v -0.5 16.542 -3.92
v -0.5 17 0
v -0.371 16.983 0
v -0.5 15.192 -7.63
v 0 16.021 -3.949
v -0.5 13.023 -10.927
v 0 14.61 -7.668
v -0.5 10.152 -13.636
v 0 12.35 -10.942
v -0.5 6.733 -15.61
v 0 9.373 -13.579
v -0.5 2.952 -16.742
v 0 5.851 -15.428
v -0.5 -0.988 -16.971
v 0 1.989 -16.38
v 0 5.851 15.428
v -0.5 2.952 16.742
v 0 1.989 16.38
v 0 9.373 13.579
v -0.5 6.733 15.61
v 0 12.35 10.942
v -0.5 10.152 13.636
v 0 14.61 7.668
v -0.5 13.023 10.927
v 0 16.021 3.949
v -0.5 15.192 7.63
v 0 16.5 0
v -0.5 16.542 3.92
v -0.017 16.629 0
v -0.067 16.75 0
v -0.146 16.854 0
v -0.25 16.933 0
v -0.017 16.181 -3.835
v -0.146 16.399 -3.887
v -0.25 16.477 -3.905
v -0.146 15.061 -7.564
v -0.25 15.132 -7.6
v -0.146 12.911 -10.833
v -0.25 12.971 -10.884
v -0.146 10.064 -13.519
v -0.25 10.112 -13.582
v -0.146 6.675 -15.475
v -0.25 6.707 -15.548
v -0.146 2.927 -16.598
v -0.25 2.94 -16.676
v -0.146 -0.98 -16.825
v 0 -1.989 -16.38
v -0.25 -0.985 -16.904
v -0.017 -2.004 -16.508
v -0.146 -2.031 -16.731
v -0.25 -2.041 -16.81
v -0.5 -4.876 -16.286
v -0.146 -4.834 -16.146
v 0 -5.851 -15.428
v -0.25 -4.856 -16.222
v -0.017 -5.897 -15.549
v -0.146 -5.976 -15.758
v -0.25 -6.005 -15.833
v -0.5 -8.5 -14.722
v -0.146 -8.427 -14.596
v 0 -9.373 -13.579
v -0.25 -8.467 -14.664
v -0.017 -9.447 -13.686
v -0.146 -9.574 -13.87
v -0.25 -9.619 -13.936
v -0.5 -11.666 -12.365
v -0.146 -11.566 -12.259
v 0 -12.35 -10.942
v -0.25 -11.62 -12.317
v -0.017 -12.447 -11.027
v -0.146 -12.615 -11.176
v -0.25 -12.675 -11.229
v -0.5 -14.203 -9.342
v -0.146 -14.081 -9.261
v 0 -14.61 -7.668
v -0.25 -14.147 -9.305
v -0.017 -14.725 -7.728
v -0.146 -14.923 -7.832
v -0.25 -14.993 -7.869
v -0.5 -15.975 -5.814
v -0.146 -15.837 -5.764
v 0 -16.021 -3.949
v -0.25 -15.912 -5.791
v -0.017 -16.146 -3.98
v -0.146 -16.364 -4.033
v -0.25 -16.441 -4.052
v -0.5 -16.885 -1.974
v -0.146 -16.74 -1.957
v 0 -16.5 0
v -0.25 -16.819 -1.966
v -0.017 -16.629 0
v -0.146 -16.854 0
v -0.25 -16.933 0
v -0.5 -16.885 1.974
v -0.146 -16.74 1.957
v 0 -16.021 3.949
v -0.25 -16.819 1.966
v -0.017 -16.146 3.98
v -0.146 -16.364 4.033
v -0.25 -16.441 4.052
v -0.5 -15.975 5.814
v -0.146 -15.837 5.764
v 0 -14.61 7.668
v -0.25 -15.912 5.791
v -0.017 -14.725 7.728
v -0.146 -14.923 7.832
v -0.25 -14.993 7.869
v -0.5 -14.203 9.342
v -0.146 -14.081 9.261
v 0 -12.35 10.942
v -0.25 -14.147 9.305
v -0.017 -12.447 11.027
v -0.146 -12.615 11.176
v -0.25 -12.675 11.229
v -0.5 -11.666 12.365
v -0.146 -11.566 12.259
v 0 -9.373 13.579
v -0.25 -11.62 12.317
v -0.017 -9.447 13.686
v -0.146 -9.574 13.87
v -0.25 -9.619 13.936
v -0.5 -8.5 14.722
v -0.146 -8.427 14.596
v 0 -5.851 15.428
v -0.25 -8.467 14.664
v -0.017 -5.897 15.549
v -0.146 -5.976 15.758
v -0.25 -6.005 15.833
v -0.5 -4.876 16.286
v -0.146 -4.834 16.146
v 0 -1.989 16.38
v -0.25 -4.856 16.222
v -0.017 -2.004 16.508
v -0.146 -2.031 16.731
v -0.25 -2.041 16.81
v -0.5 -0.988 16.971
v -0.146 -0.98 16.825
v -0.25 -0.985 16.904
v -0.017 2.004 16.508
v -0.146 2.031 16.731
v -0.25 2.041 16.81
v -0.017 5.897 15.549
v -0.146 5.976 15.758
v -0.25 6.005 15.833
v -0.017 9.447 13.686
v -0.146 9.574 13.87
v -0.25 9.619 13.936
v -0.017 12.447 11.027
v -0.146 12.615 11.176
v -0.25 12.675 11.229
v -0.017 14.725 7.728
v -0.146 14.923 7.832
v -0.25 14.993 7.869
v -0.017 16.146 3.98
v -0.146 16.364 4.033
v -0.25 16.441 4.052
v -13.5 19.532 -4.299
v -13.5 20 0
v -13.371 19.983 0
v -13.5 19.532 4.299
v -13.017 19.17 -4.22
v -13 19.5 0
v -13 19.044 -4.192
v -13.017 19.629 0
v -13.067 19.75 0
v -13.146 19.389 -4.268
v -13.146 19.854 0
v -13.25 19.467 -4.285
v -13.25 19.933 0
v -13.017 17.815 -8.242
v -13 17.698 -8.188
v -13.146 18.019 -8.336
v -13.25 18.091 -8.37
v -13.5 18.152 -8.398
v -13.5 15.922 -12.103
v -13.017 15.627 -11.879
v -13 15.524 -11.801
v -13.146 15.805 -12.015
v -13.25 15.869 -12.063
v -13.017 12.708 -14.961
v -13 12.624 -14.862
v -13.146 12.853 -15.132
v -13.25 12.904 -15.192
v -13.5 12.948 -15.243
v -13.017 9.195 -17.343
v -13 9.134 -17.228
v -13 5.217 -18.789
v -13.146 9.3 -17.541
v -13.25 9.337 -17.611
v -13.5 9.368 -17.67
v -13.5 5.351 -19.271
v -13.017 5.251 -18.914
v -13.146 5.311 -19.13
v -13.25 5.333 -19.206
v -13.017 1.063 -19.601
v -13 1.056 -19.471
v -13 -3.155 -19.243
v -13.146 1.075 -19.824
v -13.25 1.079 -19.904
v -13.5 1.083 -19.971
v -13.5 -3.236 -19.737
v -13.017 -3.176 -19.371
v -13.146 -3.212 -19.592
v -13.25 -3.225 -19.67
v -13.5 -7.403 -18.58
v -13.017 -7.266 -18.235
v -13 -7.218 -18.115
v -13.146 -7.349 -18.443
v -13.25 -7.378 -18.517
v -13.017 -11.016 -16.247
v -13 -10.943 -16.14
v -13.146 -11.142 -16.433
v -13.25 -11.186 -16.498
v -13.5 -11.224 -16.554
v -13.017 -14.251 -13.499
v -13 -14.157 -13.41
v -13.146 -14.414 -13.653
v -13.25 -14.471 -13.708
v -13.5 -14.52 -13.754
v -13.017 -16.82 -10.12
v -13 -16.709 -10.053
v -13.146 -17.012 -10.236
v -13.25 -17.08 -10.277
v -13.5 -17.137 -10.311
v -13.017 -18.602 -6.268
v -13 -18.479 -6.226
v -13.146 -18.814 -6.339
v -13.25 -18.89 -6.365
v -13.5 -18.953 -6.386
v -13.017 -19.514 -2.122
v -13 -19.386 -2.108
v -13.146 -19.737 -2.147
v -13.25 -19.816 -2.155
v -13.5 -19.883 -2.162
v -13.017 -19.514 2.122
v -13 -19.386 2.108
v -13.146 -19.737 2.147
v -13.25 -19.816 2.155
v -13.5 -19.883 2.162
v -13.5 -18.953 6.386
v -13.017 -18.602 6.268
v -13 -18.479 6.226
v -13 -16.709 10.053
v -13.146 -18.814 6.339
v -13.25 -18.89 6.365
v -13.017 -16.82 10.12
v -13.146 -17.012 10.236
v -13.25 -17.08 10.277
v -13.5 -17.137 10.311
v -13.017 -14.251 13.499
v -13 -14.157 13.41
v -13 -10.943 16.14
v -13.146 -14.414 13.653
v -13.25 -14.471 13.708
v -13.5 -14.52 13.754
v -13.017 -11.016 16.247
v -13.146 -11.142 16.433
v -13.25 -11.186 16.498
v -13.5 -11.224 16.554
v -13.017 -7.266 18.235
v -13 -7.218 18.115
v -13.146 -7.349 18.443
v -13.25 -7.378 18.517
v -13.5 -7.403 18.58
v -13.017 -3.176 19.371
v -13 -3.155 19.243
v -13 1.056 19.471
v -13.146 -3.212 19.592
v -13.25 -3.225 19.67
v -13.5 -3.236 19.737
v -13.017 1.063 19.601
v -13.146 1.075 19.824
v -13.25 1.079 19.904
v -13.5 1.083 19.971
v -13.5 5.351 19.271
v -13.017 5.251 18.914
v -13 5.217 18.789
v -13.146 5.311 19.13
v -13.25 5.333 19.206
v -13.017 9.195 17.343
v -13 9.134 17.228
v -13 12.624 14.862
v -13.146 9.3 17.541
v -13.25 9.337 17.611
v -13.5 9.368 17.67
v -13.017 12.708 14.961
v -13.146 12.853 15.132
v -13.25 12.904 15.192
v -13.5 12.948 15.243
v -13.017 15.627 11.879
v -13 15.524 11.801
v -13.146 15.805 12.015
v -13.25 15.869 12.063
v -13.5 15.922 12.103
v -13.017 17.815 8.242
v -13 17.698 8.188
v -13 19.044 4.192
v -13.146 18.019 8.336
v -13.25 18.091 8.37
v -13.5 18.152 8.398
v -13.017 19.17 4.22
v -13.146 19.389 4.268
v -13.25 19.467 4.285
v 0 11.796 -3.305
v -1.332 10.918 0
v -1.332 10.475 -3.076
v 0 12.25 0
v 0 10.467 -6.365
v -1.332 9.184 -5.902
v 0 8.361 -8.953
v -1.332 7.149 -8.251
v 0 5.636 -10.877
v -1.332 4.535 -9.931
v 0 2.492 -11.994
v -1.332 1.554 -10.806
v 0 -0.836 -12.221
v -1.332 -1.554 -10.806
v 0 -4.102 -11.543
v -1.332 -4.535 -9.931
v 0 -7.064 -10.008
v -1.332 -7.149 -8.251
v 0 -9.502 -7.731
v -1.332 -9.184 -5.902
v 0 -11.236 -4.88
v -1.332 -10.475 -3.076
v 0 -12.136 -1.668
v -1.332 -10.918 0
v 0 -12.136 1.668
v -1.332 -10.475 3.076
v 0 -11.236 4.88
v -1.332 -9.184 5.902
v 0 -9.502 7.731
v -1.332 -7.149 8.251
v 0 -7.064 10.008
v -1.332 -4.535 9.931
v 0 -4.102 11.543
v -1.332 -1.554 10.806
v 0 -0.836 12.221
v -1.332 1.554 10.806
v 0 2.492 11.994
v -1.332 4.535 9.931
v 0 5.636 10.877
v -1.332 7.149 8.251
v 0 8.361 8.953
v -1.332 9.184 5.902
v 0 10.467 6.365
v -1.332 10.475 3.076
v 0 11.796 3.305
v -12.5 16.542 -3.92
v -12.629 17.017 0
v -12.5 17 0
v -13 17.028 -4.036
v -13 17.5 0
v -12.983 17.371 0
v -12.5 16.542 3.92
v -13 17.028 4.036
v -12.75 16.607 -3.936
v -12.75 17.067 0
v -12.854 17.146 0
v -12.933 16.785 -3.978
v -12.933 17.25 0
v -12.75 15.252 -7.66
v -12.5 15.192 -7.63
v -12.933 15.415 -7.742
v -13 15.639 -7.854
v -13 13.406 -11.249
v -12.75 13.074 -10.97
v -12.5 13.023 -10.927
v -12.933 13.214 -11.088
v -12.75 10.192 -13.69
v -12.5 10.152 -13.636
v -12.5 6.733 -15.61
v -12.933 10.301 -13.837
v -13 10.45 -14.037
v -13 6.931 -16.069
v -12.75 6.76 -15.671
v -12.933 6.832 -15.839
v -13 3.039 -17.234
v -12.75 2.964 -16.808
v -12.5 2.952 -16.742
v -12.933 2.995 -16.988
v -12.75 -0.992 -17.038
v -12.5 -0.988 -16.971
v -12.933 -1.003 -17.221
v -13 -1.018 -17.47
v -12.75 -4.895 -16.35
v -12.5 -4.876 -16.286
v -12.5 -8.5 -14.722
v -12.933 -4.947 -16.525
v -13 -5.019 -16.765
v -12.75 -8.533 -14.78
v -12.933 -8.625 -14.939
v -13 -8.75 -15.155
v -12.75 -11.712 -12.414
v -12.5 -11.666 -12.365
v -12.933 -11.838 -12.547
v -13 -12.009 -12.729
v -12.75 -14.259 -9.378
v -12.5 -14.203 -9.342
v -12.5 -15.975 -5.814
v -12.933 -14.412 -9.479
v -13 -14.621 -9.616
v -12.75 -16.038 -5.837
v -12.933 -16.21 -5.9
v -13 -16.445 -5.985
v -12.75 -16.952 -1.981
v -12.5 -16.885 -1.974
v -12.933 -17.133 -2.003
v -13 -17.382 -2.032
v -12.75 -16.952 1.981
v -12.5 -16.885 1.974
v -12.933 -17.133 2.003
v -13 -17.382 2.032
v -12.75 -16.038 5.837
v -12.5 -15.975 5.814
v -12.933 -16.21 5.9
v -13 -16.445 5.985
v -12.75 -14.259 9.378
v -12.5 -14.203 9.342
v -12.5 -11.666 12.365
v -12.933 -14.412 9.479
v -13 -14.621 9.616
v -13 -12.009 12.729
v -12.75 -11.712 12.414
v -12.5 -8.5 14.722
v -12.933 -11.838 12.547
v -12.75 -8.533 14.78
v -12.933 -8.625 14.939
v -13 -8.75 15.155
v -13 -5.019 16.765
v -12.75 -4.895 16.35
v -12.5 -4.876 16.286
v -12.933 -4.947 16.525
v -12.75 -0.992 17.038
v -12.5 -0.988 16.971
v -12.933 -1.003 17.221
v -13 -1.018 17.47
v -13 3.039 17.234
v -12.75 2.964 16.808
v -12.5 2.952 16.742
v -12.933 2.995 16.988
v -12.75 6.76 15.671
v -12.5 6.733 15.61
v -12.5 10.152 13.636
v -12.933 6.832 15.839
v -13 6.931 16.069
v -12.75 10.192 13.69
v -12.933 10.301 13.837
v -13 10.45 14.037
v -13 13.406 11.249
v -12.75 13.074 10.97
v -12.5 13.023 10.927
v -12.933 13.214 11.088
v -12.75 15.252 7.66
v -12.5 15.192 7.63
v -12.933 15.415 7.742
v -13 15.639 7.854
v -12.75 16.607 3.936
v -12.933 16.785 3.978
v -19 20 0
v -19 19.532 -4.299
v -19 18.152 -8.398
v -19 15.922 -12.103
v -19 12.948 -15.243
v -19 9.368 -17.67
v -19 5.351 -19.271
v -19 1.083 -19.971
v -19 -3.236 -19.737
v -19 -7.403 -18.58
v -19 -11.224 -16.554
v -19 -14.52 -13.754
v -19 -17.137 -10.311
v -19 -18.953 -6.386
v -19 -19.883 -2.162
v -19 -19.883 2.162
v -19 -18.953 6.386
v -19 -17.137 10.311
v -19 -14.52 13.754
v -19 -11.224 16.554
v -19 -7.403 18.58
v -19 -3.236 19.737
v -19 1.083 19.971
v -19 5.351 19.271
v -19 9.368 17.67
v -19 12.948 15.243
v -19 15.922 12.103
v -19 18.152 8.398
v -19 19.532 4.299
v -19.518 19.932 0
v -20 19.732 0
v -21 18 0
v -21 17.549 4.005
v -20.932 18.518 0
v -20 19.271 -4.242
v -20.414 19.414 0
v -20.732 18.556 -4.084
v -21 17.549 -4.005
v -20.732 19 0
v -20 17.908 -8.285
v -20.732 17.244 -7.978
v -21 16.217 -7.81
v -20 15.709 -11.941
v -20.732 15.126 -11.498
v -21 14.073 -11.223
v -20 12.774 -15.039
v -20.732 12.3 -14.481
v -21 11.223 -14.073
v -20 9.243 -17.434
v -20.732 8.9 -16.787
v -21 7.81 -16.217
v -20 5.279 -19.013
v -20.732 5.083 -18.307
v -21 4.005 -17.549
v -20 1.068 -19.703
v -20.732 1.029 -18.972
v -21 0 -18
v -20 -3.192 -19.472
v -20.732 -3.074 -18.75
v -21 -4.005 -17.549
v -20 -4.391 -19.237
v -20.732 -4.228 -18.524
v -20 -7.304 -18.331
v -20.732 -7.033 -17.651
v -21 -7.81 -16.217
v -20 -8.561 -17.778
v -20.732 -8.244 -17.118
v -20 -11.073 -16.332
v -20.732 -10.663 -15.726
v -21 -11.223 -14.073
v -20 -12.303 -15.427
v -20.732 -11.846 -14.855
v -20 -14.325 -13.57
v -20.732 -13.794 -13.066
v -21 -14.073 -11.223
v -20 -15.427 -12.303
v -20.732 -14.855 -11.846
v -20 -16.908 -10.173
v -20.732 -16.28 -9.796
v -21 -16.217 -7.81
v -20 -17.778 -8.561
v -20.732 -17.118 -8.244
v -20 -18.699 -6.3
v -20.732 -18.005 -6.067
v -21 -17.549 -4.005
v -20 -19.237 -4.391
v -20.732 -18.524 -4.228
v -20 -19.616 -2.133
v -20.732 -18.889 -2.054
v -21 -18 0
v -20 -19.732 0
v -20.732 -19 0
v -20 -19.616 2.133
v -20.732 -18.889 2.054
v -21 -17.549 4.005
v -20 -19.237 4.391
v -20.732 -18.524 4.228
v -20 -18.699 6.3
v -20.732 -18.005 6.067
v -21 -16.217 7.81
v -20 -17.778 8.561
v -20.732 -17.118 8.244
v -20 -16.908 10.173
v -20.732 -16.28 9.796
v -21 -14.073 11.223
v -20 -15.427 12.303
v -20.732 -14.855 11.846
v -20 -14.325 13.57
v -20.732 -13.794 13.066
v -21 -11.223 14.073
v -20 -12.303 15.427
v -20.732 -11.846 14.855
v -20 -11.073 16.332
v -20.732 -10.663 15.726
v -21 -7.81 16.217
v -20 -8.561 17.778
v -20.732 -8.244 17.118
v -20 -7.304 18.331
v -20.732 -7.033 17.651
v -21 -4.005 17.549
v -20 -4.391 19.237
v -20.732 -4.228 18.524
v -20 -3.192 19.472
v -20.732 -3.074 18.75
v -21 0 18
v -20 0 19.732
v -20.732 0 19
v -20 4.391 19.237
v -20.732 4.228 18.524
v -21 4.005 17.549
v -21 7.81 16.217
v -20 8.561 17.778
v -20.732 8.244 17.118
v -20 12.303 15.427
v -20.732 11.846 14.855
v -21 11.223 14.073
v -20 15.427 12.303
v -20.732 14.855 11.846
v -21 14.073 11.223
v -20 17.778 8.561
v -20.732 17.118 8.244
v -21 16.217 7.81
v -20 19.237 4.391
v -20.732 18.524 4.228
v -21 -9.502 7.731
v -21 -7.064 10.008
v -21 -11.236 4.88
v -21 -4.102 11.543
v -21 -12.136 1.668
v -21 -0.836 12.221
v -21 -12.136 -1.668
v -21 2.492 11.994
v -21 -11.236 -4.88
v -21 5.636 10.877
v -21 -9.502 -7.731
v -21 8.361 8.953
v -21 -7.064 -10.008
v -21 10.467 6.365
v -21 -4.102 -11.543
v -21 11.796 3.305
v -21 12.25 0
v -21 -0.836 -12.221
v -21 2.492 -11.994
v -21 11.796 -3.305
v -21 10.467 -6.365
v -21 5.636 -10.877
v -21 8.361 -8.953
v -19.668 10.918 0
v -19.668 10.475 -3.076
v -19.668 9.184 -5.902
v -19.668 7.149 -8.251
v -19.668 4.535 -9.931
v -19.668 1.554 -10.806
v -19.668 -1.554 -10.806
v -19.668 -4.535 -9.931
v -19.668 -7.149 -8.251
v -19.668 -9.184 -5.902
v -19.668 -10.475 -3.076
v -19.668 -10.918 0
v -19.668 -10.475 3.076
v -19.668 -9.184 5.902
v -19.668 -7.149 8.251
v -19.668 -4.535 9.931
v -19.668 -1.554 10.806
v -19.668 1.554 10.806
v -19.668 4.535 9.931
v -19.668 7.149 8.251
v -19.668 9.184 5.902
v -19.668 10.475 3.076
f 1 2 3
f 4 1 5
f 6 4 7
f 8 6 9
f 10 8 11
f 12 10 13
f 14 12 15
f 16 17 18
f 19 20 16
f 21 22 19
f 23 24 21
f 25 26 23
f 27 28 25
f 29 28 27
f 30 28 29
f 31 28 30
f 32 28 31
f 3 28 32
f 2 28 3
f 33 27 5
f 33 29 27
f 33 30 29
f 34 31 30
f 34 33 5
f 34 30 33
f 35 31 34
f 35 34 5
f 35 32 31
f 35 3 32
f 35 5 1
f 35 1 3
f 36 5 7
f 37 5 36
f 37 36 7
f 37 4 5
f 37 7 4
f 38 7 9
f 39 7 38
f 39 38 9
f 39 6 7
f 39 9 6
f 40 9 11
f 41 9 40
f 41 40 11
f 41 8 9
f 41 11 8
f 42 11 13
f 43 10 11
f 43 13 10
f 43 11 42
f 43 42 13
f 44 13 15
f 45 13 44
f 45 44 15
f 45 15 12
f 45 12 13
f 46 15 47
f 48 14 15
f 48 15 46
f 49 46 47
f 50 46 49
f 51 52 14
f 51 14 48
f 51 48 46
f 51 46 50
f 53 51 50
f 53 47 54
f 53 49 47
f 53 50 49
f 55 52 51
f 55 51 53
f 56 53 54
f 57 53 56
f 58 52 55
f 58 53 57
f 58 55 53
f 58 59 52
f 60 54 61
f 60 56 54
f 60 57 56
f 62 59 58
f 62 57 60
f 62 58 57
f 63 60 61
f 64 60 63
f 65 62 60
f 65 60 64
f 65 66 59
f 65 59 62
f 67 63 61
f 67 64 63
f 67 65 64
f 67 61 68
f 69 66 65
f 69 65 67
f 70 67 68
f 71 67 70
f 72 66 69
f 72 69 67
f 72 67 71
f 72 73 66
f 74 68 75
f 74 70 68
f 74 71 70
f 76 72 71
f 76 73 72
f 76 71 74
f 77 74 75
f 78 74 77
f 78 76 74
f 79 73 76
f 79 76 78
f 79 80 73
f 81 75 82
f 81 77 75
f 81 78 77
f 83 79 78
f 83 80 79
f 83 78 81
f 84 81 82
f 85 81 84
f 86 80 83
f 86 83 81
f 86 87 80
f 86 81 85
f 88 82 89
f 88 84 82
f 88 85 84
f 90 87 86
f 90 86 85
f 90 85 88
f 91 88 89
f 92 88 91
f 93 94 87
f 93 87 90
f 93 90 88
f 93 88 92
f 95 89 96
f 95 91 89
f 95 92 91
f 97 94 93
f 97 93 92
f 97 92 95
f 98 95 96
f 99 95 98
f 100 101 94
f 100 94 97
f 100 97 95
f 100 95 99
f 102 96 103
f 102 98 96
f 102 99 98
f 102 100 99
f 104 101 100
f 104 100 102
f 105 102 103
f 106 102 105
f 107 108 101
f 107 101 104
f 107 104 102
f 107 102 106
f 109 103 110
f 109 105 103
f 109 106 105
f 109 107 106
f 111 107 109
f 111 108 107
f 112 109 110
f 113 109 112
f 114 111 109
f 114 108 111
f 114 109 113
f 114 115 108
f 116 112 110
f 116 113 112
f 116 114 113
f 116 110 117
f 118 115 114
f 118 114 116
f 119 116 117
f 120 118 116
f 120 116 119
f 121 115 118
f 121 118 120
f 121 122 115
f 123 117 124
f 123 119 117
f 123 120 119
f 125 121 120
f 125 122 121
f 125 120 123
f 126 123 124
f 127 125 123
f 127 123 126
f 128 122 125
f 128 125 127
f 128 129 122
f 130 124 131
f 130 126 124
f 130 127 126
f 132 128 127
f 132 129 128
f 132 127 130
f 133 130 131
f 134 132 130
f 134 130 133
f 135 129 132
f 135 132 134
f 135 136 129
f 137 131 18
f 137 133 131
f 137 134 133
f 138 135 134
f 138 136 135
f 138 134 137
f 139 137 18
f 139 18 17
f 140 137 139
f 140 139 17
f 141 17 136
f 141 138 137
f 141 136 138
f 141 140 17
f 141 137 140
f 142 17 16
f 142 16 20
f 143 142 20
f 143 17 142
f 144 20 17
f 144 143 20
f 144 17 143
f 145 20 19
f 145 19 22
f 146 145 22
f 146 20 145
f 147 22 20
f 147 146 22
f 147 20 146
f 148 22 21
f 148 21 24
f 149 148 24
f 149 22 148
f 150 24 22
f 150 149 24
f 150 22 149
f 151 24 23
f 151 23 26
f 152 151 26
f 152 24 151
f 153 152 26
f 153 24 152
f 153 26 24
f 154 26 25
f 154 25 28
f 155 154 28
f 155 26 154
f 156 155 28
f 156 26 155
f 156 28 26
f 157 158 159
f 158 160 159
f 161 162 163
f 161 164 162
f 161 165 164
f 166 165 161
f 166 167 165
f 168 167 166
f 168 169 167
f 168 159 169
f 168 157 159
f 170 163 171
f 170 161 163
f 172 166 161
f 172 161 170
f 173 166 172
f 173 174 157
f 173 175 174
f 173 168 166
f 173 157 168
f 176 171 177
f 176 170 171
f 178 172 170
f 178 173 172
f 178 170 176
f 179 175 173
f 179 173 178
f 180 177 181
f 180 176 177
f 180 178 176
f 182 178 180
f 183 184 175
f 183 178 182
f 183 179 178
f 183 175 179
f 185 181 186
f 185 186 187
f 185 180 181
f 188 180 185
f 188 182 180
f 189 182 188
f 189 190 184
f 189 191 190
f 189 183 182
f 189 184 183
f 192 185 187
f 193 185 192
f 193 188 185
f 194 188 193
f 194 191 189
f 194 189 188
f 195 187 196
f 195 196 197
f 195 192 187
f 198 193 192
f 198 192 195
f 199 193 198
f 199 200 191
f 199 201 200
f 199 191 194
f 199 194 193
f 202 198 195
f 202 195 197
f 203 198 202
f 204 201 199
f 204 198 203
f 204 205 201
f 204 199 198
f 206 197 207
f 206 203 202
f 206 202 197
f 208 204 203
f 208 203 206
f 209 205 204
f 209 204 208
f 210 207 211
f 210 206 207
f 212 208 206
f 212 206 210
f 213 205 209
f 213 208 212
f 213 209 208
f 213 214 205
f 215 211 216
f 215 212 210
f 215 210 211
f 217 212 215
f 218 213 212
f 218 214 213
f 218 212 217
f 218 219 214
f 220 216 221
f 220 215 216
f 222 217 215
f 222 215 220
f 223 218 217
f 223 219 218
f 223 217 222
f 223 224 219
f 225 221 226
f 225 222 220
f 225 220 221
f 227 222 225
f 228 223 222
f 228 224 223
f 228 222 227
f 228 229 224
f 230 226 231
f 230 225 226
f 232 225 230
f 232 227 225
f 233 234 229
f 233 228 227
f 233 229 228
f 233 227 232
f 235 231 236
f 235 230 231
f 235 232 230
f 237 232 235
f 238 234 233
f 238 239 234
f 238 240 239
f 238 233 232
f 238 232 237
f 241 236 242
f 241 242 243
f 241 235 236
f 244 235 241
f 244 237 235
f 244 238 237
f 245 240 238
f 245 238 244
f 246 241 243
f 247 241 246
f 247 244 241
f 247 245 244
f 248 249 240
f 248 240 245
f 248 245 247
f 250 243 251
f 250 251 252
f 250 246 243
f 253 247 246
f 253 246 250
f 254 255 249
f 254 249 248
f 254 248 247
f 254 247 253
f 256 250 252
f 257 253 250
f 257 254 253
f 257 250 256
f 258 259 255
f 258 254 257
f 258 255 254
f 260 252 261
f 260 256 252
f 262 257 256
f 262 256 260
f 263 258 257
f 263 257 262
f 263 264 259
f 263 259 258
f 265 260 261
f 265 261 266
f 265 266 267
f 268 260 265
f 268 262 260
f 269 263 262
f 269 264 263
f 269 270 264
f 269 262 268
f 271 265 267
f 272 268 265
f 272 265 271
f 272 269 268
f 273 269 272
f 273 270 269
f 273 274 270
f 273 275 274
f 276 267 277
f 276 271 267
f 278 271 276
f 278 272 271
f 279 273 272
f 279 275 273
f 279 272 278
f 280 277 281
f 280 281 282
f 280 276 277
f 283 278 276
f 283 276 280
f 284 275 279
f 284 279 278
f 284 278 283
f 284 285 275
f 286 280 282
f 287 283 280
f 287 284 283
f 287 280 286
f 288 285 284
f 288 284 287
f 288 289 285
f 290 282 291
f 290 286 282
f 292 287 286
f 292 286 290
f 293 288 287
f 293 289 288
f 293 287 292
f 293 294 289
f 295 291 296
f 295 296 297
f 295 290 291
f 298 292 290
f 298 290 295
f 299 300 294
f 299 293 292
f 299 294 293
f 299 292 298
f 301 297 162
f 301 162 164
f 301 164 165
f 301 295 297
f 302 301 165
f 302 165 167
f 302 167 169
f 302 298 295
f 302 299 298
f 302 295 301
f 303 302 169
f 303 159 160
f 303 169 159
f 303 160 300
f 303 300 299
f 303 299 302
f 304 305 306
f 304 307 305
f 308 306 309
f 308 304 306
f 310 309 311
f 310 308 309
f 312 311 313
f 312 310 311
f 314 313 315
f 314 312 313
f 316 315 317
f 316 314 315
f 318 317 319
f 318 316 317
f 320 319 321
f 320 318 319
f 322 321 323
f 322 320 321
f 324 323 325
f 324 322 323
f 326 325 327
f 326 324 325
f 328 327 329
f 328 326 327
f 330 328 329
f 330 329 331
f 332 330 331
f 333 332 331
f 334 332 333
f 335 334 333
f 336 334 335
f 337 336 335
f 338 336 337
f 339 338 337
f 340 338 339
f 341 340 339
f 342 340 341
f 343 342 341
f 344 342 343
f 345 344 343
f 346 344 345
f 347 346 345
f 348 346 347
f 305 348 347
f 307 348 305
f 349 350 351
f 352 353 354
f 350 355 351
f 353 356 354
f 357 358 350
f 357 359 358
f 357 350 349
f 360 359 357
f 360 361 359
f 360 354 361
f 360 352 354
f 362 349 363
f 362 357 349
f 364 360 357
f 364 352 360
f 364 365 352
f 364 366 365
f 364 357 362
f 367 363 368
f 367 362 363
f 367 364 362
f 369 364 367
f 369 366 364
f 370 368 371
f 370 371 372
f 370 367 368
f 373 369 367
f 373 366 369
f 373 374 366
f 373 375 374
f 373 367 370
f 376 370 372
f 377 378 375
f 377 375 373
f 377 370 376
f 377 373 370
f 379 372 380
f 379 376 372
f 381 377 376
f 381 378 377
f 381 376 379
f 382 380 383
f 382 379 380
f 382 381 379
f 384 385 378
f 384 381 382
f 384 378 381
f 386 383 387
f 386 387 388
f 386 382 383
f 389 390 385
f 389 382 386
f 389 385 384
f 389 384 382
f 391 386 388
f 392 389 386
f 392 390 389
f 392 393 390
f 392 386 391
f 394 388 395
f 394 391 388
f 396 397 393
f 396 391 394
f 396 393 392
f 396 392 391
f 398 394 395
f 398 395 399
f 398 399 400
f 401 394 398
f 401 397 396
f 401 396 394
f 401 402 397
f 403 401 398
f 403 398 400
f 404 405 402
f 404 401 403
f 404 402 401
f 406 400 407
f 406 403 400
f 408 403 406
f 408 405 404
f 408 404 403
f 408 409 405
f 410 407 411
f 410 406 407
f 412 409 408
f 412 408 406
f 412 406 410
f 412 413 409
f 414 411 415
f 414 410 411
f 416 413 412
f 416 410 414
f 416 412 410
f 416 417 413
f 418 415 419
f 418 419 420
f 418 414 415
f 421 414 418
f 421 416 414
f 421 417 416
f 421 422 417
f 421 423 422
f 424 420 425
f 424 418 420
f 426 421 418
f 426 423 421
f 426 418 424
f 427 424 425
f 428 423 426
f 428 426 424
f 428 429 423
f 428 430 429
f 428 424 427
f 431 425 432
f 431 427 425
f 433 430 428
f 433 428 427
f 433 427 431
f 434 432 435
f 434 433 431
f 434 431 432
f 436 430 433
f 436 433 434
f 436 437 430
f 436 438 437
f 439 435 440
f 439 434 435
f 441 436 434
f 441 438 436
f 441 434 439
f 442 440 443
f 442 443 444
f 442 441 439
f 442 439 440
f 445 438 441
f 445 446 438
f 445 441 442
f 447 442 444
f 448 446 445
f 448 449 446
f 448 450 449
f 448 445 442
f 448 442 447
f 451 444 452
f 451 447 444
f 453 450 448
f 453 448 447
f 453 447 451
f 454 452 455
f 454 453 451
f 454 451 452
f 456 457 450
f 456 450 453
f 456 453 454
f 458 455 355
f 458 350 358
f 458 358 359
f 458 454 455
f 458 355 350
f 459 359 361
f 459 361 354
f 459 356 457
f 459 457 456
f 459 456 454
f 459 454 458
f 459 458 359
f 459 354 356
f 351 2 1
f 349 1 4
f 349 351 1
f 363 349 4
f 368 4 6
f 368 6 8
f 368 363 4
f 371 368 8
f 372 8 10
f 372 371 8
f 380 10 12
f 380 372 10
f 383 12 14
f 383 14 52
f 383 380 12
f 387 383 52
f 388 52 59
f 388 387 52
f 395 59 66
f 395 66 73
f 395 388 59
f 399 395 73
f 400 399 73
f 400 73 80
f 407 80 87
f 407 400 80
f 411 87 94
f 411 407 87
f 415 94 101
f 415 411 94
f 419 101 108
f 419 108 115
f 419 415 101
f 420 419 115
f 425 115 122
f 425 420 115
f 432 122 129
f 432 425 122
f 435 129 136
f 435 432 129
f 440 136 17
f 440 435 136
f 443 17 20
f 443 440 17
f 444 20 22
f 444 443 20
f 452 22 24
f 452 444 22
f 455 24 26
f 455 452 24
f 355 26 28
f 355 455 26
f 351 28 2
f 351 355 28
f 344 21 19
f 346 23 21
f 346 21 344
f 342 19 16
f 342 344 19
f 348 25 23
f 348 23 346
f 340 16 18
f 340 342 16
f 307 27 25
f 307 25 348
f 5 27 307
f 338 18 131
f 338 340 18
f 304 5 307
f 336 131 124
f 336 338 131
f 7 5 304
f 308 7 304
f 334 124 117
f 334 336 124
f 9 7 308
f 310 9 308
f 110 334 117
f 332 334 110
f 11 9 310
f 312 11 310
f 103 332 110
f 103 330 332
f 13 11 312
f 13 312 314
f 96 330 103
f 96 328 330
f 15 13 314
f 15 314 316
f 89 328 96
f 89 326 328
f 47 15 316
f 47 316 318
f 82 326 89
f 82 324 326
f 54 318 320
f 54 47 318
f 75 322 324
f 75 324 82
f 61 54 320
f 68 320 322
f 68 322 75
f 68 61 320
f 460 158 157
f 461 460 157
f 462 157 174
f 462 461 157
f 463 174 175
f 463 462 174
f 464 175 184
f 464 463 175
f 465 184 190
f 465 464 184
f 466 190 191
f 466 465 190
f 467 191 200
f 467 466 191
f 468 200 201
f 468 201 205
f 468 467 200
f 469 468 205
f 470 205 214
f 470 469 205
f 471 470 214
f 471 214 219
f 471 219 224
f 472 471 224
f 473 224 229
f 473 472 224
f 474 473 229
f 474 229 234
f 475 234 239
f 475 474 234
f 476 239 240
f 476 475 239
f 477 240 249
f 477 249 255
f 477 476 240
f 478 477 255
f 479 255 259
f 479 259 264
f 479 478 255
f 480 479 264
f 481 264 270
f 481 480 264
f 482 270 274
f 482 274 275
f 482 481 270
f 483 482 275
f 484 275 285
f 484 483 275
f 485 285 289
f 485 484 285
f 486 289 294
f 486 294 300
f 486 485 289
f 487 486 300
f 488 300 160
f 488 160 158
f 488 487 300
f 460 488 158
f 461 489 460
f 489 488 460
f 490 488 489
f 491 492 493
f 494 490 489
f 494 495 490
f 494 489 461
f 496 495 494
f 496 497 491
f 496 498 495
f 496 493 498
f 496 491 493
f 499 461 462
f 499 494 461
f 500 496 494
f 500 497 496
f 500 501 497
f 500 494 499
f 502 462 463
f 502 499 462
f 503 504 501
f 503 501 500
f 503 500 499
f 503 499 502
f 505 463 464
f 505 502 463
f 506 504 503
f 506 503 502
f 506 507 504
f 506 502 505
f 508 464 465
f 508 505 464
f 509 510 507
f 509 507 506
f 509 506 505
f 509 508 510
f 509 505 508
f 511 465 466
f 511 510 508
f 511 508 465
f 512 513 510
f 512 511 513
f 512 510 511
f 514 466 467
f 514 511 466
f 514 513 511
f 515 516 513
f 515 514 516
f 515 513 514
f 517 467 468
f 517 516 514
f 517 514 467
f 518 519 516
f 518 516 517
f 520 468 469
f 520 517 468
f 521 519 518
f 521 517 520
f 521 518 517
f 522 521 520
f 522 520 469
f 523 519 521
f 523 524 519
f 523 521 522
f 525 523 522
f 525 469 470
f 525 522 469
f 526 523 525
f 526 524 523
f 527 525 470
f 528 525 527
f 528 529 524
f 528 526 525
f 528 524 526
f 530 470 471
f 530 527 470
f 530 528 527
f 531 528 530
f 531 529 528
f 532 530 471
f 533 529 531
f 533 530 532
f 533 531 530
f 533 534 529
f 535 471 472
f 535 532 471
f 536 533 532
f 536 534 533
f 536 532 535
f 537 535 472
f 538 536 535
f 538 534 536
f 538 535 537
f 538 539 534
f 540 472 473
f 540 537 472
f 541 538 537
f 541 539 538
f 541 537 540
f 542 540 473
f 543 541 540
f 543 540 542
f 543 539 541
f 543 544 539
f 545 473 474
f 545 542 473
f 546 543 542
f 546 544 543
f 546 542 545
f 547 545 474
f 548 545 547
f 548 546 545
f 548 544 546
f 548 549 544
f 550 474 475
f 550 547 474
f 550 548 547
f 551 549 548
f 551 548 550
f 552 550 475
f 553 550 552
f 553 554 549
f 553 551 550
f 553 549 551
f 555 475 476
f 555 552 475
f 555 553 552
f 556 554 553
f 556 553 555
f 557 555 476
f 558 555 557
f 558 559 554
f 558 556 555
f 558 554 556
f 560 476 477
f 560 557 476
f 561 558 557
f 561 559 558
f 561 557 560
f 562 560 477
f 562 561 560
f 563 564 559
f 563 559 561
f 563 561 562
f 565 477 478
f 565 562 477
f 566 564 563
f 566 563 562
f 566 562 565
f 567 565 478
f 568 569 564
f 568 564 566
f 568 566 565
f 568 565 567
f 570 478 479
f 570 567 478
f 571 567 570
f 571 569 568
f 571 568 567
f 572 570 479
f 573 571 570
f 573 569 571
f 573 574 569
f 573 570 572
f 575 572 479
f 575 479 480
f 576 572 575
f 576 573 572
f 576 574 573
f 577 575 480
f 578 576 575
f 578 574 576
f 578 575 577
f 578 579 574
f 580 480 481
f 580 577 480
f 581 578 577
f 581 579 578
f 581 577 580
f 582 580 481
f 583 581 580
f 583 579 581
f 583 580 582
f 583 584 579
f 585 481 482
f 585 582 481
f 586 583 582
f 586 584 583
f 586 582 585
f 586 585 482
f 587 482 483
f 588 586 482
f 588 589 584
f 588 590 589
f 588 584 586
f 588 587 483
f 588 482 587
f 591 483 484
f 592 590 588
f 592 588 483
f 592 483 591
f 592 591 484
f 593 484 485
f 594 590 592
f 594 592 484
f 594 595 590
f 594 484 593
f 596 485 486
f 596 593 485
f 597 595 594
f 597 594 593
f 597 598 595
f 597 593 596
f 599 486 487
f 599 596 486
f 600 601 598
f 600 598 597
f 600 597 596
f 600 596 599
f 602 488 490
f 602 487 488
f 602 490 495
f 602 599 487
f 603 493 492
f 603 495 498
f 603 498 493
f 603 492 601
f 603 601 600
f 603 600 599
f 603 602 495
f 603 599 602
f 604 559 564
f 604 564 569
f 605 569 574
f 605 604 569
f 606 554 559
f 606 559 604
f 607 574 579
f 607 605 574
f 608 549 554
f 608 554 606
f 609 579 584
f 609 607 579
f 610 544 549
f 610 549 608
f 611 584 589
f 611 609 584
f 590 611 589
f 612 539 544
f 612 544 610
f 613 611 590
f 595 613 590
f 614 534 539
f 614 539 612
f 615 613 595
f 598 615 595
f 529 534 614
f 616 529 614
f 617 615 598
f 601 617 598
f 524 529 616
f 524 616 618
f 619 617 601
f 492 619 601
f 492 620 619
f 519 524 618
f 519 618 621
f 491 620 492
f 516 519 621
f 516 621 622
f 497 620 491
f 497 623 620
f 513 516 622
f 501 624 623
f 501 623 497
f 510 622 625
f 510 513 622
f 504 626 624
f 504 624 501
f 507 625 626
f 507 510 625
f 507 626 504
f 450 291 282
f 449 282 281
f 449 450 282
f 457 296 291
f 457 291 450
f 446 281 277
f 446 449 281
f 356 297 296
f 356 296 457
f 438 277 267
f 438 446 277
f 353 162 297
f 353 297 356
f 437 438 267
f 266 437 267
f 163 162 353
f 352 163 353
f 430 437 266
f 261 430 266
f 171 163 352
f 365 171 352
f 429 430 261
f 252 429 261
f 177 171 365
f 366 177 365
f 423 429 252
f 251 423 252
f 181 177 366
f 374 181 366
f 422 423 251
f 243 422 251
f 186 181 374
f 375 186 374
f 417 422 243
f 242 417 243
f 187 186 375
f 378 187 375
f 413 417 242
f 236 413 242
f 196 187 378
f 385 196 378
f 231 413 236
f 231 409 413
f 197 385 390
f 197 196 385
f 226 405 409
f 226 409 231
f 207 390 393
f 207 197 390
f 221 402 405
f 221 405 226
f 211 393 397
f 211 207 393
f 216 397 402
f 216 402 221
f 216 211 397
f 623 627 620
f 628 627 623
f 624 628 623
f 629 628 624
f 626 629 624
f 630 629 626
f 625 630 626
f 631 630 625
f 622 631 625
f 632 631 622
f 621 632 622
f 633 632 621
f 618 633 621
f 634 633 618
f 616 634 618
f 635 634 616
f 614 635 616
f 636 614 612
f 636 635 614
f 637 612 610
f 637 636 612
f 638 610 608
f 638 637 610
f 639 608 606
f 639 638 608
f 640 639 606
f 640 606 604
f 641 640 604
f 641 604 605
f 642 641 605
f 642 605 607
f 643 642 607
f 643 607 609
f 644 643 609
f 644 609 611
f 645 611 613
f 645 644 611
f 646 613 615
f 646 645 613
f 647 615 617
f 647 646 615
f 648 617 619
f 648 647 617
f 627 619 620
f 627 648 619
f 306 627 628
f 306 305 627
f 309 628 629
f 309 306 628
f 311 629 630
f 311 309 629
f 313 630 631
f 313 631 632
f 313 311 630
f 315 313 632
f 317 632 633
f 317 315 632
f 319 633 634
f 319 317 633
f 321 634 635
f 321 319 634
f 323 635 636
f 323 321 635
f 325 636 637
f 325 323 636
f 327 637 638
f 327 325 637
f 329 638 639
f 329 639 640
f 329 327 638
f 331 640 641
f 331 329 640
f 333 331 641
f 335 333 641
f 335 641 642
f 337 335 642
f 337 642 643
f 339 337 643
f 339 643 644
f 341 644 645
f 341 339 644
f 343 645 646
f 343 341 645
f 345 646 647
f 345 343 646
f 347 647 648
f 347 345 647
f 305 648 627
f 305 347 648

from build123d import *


with BuildPart() as part:
    # Sketch1 → Base-Revolve (revolve)
    with BuildSketch(Plane.XY):
        with BuildLine():
            Line((0, 12.25), (0, 16.5))
            ThreePointArc((0, 16.5), (-0.146446609, 16.853553391), (-0.5, 17))
            Line((-0.5, 17), (-12.5, 17))
            ThreePointArc((-12.5, 17), (-12.853553391, 17.146446609), (-13, 17.5))
            Line((-13, 17.5), (-13, 19.5))
            ThreePointArc((-13, 19.5), (-13.146446609, 19.853553391), (-13.5, 20))
            Line((-13.5, 20), (-19, 20))
            ThreePointArc((-19, 20), (-20.414213562, 19.414213562), (-21, 18))
            Line((-21, 18), (-21, 12.25))
            Line((-21, 12.25), (-19.6675, 10.9175))
            Line((-19.6675, 10.9175), (-1.3325, 10.9175))
            Line((-1.3325, 10.9175), (0, 12.25))
        make_face()
    revolve(axis=Axis((0, 0, 0), (-1, 0, 0)))


solid = part.part
